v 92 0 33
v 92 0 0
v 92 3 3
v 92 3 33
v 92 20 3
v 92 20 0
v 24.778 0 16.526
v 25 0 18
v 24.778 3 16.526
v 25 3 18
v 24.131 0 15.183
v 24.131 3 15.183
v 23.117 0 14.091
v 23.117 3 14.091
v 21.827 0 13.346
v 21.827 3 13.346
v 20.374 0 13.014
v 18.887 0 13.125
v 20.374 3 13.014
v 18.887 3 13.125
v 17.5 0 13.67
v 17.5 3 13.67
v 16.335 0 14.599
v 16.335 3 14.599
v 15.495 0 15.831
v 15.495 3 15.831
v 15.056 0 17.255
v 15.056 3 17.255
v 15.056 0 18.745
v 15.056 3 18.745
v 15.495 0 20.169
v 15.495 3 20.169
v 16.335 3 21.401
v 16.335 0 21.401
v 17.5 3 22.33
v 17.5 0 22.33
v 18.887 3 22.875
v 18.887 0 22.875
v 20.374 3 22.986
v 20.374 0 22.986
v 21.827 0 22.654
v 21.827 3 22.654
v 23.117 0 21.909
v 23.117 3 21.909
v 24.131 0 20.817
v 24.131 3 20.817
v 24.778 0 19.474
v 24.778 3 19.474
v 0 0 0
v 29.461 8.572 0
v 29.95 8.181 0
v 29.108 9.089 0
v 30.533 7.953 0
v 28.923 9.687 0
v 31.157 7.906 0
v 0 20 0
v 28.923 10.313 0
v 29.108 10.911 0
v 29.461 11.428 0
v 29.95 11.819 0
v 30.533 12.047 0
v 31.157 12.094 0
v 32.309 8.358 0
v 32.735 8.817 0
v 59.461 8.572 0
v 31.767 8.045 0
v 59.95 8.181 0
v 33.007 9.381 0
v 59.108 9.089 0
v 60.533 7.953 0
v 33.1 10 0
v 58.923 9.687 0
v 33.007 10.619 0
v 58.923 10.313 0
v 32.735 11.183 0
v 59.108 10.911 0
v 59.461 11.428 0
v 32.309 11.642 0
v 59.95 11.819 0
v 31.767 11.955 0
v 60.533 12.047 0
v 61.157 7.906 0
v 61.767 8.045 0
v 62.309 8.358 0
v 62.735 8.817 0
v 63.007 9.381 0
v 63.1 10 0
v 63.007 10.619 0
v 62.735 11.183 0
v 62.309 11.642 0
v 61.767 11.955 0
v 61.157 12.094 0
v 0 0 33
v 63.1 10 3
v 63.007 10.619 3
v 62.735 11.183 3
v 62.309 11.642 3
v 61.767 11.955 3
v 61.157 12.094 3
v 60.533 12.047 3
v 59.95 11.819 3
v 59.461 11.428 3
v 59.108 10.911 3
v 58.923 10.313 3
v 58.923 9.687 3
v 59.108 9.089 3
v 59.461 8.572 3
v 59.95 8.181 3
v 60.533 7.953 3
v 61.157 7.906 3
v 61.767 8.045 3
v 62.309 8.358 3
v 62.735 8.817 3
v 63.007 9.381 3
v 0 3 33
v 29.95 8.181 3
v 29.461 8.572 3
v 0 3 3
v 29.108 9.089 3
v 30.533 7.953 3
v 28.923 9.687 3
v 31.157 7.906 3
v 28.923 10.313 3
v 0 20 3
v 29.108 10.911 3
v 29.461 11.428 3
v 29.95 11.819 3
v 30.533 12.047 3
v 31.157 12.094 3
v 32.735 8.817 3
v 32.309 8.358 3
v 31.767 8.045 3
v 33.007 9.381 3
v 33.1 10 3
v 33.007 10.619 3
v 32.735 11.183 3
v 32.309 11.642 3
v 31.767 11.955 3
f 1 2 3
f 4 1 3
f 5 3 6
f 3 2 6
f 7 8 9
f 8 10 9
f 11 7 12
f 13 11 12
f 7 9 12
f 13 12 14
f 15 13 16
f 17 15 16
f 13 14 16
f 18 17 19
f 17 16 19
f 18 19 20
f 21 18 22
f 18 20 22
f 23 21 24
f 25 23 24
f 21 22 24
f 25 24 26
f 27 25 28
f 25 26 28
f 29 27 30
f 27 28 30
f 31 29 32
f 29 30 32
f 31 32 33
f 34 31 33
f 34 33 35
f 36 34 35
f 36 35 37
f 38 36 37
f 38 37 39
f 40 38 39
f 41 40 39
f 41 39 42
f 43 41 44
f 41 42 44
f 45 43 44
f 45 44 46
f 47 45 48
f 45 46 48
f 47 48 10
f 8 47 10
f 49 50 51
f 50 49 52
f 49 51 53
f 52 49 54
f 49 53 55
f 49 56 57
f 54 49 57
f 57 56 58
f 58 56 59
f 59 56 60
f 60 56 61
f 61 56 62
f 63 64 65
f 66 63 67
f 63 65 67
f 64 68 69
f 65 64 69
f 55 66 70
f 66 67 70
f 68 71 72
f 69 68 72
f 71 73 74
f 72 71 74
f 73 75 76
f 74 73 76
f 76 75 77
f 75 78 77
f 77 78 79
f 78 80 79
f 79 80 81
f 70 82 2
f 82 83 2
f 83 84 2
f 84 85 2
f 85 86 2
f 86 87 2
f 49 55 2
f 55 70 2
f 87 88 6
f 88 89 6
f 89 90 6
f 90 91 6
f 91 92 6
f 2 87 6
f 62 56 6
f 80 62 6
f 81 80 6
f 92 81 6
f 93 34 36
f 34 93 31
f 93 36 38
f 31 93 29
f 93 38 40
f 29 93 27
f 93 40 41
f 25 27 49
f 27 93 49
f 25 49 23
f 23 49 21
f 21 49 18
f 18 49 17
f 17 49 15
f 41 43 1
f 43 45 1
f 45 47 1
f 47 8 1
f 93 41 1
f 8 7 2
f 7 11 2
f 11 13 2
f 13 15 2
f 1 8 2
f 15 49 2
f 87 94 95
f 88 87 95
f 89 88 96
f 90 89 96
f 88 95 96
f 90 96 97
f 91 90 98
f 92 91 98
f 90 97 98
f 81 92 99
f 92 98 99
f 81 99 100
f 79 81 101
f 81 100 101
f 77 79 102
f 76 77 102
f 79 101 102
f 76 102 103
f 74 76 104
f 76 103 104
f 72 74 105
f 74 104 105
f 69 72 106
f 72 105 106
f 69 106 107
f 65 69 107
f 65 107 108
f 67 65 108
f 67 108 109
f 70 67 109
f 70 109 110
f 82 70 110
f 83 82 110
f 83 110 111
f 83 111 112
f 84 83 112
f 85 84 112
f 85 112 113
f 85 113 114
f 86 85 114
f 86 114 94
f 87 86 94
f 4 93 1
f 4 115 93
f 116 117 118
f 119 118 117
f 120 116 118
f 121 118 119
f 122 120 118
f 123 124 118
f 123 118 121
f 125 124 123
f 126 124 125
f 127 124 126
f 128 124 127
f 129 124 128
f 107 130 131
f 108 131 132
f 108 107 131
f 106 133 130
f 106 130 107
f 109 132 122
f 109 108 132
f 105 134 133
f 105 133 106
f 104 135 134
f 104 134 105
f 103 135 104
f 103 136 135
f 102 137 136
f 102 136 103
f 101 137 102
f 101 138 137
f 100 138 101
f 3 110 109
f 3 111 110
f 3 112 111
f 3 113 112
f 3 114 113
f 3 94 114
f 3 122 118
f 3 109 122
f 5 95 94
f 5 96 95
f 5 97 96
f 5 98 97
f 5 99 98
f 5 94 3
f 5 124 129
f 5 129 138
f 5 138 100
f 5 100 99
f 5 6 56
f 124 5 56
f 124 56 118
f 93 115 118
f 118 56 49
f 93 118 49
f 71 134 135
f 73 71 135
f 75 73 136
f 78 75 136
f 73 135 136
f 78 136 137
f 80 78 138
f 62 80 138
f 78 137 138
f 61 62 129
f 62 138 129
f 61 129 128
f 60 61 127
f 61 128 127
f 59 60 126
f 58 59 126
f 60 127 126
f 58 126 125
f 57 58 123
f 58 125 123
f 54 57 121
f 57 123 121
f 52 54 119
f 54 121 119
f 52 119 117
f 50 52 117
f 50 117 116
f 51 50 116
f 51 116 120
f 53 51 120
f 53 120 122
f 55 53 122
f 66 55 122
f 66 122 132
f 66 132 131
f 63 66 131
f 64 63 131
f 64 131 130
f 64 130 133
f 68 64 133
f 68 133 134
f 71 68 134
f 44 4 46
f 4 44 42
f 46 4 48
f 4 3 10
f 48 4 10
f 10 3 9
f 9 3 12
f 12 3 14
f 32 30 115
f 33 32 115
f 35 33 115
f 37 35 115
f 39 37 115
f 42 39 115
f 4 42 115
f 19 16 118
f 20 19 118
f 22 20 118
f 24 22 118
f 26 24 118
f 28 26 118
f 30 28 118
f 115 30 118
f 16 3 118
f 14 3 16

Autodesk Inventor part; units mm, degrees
ref_plane "YZ Plane" through (0, 0, 0) normal (1, 0, 0) x (0, 1, 0)
ref_plane "XZ Plane" through (0, 0, 0) normal (0, 1, 0) x (-1, 0, 0)
ref_plane "XY Plane" through (0, 0, 0) normal (0, 0, 1) x (1, 0, 0)
sketch "Sketch1" plane through (0, 0, 0) normal (0, 0, 1) x (1, 0, 0)
  line L0 (0, 0) -> (92, 0)
  line L1 (92, 0) -> (92, 20)
  line L2 (92, 20) -> (0, 20)
  line L3 (0, 20) -> (0, 0)
  dimension "d0" = 92
  dimension "d1" = 20
extrude "Extrusion1" add sketch "Sketch1" along normal blind 3
sketch "Sketch2" plane through (0, 0, 3) normal (0, 0, 1) x (1, 0, 0)
  line L0 (0, 0) -> (92, 0) projected
  line L1 (92, 0) -> (92, 20) projected
  line L2 (92, 20) -> (0, 20) projected
  line L3 (0, 20) -> (0, 0) projected
  circle A0 centre (31, 10) radius 2.1
  circle A1 centre (61, 10) radius 2.1
  dimension "d5" = 4.2
  dimension "d6" = 31
  dimension "d7" = 10
  dimension "d8" = 10
  dimension "d9" = 31
  dimension "d10" = 4.2
extrude "Extrusion2" cut sketch "Sketch2" against normal up to next contours A0 | A1
sketch "Sketch3" plane through (0, 0, 3) normal (0, 0, 1) x (1, 0, 0)
  line L0 (92, 0) -> (92, 20) projected
  line L1 (0, 0) -> (92, 0)
  line L2 (92, 0) -> (92, 3)
  line L3 (92, 3) -> (0, 3)
  line L4 (0, 3) -> (0, 0)
  dimension "d13" = 3
extrude "Extrusion3" add sketch "Sketch3" along normal blind 30
sketch "Sketch4" plane through (0, 3, 3) normal (0, 1, 0) x (1, 0, 0)
  circle A0 centre (20, -15) radius 5
  line L0 (0, 0) -> (92, 0) projected
  line L1 (0, 0) -> (0, -30) projected
  line L2 (92, -30) -> (0, -30) projected
  line L3 (92, 0) -> (92, -30) projected
  point P0 (0, 3)
  dimension "d16" = 20
  dimension "d17" = 15
  dimension "d18" = 10
extrude "Extrusion4" cut sketch "Sketch4" against normal blind 30 contours A0
properties part number "EE_Base-Rod-Rev2"
